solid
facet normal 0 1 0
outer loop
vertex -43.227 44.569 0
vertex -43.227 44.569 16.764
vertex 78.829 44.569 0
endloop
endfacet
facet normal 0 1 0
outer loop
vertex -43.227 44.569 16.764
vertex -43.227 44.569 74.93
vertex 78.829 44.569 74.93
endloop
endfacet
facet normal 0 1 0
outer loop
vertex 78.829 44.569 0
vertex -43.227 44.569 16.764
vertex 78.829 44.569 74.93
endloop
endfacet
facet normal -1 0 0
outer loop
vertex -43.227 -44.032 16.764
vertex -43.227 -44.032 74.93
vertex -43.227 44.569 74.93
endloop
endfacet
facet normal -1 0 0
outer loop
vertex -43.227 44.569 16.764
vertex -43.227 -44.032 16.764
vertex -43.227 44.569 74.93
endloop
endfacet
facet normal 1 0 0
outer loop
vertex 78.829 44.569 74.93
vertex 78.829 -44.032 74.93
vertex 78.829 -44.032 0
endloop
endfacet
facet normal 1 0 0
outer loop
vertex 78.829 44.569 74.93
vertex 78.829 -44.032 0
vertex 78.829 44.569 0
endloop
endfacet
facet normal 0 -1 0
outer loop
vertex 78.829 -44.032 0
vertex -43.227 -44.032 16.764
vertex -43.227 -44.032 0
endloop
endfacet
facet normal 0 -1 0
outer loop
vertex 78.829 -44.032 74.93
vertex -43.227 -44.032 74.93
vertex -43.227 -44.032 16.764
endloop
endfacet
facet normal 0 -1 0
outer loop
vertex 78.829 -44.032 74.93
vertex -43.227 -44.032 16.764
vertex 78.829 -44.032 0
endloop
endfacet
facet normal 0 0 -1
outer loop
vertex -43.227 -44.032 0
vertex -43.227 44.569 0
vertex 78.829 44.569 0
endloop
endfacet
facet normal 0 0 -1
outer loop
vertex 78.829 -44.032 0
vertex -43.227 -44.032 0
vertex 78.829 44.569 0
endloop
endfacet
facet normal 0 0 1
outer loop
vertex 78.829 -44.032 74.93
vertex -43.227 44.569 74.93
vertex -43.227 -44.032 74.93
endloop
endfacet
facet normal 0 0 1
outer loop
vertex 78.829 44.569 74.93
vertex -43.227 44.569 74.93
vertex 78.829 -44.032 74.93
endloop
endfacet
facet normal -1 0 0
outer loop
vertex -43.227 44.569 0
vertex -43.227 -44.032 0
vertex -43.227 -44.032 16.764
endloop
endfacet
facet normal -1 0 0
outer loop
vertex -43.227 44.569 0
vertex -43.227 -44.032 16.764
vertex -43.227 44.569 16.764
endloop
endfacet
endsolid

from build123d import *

# Parameters (mm, degrees)
F0_W      = 96.656375
F0_H      = 88.601682
F1_DEPTH  = 74.93
F1_FACE_W = 88.601682
F1_FACE_H = 74.93
F2_DEPTH  = 25.4
F2_FACE_W = 122.056374
F2_FACE_H = 88.601682
F3_DEPTH  = 58.166


with BuildPart() as f1:
    # F0 (on Top) → F1 (new body)
    with BuildSketch(Plane.XY):
        with Locations((5.101309, 0.268491)):
            Rectangle(F0_W, F0_H)
    extrude(amount=F1_DEPTH)

    # F1_face (on face) → F2 (join)
    with BuildSketch(Plane(origin=(53.429496, 0.268491, 37.465), x_dir=(0, 1, 0), z_dir=(1, 0, 0))):
        Rectangle(F1_FACE_W, F1_FACE_H)
    extrude(amount=F2_DEPTH)

    # F2_face (on face) → F3 (join)
    with BuildSketch(Plane(origin=(17.801308, 0.268491, 74.93), x_dir=(1, 0, 0), z_dir=(0, 0, 1))):
        Rectangle(F2_FACE_W, F2_FACE_H)
    extrude(amount=-F3_DEPTH)


solid = f1.part
